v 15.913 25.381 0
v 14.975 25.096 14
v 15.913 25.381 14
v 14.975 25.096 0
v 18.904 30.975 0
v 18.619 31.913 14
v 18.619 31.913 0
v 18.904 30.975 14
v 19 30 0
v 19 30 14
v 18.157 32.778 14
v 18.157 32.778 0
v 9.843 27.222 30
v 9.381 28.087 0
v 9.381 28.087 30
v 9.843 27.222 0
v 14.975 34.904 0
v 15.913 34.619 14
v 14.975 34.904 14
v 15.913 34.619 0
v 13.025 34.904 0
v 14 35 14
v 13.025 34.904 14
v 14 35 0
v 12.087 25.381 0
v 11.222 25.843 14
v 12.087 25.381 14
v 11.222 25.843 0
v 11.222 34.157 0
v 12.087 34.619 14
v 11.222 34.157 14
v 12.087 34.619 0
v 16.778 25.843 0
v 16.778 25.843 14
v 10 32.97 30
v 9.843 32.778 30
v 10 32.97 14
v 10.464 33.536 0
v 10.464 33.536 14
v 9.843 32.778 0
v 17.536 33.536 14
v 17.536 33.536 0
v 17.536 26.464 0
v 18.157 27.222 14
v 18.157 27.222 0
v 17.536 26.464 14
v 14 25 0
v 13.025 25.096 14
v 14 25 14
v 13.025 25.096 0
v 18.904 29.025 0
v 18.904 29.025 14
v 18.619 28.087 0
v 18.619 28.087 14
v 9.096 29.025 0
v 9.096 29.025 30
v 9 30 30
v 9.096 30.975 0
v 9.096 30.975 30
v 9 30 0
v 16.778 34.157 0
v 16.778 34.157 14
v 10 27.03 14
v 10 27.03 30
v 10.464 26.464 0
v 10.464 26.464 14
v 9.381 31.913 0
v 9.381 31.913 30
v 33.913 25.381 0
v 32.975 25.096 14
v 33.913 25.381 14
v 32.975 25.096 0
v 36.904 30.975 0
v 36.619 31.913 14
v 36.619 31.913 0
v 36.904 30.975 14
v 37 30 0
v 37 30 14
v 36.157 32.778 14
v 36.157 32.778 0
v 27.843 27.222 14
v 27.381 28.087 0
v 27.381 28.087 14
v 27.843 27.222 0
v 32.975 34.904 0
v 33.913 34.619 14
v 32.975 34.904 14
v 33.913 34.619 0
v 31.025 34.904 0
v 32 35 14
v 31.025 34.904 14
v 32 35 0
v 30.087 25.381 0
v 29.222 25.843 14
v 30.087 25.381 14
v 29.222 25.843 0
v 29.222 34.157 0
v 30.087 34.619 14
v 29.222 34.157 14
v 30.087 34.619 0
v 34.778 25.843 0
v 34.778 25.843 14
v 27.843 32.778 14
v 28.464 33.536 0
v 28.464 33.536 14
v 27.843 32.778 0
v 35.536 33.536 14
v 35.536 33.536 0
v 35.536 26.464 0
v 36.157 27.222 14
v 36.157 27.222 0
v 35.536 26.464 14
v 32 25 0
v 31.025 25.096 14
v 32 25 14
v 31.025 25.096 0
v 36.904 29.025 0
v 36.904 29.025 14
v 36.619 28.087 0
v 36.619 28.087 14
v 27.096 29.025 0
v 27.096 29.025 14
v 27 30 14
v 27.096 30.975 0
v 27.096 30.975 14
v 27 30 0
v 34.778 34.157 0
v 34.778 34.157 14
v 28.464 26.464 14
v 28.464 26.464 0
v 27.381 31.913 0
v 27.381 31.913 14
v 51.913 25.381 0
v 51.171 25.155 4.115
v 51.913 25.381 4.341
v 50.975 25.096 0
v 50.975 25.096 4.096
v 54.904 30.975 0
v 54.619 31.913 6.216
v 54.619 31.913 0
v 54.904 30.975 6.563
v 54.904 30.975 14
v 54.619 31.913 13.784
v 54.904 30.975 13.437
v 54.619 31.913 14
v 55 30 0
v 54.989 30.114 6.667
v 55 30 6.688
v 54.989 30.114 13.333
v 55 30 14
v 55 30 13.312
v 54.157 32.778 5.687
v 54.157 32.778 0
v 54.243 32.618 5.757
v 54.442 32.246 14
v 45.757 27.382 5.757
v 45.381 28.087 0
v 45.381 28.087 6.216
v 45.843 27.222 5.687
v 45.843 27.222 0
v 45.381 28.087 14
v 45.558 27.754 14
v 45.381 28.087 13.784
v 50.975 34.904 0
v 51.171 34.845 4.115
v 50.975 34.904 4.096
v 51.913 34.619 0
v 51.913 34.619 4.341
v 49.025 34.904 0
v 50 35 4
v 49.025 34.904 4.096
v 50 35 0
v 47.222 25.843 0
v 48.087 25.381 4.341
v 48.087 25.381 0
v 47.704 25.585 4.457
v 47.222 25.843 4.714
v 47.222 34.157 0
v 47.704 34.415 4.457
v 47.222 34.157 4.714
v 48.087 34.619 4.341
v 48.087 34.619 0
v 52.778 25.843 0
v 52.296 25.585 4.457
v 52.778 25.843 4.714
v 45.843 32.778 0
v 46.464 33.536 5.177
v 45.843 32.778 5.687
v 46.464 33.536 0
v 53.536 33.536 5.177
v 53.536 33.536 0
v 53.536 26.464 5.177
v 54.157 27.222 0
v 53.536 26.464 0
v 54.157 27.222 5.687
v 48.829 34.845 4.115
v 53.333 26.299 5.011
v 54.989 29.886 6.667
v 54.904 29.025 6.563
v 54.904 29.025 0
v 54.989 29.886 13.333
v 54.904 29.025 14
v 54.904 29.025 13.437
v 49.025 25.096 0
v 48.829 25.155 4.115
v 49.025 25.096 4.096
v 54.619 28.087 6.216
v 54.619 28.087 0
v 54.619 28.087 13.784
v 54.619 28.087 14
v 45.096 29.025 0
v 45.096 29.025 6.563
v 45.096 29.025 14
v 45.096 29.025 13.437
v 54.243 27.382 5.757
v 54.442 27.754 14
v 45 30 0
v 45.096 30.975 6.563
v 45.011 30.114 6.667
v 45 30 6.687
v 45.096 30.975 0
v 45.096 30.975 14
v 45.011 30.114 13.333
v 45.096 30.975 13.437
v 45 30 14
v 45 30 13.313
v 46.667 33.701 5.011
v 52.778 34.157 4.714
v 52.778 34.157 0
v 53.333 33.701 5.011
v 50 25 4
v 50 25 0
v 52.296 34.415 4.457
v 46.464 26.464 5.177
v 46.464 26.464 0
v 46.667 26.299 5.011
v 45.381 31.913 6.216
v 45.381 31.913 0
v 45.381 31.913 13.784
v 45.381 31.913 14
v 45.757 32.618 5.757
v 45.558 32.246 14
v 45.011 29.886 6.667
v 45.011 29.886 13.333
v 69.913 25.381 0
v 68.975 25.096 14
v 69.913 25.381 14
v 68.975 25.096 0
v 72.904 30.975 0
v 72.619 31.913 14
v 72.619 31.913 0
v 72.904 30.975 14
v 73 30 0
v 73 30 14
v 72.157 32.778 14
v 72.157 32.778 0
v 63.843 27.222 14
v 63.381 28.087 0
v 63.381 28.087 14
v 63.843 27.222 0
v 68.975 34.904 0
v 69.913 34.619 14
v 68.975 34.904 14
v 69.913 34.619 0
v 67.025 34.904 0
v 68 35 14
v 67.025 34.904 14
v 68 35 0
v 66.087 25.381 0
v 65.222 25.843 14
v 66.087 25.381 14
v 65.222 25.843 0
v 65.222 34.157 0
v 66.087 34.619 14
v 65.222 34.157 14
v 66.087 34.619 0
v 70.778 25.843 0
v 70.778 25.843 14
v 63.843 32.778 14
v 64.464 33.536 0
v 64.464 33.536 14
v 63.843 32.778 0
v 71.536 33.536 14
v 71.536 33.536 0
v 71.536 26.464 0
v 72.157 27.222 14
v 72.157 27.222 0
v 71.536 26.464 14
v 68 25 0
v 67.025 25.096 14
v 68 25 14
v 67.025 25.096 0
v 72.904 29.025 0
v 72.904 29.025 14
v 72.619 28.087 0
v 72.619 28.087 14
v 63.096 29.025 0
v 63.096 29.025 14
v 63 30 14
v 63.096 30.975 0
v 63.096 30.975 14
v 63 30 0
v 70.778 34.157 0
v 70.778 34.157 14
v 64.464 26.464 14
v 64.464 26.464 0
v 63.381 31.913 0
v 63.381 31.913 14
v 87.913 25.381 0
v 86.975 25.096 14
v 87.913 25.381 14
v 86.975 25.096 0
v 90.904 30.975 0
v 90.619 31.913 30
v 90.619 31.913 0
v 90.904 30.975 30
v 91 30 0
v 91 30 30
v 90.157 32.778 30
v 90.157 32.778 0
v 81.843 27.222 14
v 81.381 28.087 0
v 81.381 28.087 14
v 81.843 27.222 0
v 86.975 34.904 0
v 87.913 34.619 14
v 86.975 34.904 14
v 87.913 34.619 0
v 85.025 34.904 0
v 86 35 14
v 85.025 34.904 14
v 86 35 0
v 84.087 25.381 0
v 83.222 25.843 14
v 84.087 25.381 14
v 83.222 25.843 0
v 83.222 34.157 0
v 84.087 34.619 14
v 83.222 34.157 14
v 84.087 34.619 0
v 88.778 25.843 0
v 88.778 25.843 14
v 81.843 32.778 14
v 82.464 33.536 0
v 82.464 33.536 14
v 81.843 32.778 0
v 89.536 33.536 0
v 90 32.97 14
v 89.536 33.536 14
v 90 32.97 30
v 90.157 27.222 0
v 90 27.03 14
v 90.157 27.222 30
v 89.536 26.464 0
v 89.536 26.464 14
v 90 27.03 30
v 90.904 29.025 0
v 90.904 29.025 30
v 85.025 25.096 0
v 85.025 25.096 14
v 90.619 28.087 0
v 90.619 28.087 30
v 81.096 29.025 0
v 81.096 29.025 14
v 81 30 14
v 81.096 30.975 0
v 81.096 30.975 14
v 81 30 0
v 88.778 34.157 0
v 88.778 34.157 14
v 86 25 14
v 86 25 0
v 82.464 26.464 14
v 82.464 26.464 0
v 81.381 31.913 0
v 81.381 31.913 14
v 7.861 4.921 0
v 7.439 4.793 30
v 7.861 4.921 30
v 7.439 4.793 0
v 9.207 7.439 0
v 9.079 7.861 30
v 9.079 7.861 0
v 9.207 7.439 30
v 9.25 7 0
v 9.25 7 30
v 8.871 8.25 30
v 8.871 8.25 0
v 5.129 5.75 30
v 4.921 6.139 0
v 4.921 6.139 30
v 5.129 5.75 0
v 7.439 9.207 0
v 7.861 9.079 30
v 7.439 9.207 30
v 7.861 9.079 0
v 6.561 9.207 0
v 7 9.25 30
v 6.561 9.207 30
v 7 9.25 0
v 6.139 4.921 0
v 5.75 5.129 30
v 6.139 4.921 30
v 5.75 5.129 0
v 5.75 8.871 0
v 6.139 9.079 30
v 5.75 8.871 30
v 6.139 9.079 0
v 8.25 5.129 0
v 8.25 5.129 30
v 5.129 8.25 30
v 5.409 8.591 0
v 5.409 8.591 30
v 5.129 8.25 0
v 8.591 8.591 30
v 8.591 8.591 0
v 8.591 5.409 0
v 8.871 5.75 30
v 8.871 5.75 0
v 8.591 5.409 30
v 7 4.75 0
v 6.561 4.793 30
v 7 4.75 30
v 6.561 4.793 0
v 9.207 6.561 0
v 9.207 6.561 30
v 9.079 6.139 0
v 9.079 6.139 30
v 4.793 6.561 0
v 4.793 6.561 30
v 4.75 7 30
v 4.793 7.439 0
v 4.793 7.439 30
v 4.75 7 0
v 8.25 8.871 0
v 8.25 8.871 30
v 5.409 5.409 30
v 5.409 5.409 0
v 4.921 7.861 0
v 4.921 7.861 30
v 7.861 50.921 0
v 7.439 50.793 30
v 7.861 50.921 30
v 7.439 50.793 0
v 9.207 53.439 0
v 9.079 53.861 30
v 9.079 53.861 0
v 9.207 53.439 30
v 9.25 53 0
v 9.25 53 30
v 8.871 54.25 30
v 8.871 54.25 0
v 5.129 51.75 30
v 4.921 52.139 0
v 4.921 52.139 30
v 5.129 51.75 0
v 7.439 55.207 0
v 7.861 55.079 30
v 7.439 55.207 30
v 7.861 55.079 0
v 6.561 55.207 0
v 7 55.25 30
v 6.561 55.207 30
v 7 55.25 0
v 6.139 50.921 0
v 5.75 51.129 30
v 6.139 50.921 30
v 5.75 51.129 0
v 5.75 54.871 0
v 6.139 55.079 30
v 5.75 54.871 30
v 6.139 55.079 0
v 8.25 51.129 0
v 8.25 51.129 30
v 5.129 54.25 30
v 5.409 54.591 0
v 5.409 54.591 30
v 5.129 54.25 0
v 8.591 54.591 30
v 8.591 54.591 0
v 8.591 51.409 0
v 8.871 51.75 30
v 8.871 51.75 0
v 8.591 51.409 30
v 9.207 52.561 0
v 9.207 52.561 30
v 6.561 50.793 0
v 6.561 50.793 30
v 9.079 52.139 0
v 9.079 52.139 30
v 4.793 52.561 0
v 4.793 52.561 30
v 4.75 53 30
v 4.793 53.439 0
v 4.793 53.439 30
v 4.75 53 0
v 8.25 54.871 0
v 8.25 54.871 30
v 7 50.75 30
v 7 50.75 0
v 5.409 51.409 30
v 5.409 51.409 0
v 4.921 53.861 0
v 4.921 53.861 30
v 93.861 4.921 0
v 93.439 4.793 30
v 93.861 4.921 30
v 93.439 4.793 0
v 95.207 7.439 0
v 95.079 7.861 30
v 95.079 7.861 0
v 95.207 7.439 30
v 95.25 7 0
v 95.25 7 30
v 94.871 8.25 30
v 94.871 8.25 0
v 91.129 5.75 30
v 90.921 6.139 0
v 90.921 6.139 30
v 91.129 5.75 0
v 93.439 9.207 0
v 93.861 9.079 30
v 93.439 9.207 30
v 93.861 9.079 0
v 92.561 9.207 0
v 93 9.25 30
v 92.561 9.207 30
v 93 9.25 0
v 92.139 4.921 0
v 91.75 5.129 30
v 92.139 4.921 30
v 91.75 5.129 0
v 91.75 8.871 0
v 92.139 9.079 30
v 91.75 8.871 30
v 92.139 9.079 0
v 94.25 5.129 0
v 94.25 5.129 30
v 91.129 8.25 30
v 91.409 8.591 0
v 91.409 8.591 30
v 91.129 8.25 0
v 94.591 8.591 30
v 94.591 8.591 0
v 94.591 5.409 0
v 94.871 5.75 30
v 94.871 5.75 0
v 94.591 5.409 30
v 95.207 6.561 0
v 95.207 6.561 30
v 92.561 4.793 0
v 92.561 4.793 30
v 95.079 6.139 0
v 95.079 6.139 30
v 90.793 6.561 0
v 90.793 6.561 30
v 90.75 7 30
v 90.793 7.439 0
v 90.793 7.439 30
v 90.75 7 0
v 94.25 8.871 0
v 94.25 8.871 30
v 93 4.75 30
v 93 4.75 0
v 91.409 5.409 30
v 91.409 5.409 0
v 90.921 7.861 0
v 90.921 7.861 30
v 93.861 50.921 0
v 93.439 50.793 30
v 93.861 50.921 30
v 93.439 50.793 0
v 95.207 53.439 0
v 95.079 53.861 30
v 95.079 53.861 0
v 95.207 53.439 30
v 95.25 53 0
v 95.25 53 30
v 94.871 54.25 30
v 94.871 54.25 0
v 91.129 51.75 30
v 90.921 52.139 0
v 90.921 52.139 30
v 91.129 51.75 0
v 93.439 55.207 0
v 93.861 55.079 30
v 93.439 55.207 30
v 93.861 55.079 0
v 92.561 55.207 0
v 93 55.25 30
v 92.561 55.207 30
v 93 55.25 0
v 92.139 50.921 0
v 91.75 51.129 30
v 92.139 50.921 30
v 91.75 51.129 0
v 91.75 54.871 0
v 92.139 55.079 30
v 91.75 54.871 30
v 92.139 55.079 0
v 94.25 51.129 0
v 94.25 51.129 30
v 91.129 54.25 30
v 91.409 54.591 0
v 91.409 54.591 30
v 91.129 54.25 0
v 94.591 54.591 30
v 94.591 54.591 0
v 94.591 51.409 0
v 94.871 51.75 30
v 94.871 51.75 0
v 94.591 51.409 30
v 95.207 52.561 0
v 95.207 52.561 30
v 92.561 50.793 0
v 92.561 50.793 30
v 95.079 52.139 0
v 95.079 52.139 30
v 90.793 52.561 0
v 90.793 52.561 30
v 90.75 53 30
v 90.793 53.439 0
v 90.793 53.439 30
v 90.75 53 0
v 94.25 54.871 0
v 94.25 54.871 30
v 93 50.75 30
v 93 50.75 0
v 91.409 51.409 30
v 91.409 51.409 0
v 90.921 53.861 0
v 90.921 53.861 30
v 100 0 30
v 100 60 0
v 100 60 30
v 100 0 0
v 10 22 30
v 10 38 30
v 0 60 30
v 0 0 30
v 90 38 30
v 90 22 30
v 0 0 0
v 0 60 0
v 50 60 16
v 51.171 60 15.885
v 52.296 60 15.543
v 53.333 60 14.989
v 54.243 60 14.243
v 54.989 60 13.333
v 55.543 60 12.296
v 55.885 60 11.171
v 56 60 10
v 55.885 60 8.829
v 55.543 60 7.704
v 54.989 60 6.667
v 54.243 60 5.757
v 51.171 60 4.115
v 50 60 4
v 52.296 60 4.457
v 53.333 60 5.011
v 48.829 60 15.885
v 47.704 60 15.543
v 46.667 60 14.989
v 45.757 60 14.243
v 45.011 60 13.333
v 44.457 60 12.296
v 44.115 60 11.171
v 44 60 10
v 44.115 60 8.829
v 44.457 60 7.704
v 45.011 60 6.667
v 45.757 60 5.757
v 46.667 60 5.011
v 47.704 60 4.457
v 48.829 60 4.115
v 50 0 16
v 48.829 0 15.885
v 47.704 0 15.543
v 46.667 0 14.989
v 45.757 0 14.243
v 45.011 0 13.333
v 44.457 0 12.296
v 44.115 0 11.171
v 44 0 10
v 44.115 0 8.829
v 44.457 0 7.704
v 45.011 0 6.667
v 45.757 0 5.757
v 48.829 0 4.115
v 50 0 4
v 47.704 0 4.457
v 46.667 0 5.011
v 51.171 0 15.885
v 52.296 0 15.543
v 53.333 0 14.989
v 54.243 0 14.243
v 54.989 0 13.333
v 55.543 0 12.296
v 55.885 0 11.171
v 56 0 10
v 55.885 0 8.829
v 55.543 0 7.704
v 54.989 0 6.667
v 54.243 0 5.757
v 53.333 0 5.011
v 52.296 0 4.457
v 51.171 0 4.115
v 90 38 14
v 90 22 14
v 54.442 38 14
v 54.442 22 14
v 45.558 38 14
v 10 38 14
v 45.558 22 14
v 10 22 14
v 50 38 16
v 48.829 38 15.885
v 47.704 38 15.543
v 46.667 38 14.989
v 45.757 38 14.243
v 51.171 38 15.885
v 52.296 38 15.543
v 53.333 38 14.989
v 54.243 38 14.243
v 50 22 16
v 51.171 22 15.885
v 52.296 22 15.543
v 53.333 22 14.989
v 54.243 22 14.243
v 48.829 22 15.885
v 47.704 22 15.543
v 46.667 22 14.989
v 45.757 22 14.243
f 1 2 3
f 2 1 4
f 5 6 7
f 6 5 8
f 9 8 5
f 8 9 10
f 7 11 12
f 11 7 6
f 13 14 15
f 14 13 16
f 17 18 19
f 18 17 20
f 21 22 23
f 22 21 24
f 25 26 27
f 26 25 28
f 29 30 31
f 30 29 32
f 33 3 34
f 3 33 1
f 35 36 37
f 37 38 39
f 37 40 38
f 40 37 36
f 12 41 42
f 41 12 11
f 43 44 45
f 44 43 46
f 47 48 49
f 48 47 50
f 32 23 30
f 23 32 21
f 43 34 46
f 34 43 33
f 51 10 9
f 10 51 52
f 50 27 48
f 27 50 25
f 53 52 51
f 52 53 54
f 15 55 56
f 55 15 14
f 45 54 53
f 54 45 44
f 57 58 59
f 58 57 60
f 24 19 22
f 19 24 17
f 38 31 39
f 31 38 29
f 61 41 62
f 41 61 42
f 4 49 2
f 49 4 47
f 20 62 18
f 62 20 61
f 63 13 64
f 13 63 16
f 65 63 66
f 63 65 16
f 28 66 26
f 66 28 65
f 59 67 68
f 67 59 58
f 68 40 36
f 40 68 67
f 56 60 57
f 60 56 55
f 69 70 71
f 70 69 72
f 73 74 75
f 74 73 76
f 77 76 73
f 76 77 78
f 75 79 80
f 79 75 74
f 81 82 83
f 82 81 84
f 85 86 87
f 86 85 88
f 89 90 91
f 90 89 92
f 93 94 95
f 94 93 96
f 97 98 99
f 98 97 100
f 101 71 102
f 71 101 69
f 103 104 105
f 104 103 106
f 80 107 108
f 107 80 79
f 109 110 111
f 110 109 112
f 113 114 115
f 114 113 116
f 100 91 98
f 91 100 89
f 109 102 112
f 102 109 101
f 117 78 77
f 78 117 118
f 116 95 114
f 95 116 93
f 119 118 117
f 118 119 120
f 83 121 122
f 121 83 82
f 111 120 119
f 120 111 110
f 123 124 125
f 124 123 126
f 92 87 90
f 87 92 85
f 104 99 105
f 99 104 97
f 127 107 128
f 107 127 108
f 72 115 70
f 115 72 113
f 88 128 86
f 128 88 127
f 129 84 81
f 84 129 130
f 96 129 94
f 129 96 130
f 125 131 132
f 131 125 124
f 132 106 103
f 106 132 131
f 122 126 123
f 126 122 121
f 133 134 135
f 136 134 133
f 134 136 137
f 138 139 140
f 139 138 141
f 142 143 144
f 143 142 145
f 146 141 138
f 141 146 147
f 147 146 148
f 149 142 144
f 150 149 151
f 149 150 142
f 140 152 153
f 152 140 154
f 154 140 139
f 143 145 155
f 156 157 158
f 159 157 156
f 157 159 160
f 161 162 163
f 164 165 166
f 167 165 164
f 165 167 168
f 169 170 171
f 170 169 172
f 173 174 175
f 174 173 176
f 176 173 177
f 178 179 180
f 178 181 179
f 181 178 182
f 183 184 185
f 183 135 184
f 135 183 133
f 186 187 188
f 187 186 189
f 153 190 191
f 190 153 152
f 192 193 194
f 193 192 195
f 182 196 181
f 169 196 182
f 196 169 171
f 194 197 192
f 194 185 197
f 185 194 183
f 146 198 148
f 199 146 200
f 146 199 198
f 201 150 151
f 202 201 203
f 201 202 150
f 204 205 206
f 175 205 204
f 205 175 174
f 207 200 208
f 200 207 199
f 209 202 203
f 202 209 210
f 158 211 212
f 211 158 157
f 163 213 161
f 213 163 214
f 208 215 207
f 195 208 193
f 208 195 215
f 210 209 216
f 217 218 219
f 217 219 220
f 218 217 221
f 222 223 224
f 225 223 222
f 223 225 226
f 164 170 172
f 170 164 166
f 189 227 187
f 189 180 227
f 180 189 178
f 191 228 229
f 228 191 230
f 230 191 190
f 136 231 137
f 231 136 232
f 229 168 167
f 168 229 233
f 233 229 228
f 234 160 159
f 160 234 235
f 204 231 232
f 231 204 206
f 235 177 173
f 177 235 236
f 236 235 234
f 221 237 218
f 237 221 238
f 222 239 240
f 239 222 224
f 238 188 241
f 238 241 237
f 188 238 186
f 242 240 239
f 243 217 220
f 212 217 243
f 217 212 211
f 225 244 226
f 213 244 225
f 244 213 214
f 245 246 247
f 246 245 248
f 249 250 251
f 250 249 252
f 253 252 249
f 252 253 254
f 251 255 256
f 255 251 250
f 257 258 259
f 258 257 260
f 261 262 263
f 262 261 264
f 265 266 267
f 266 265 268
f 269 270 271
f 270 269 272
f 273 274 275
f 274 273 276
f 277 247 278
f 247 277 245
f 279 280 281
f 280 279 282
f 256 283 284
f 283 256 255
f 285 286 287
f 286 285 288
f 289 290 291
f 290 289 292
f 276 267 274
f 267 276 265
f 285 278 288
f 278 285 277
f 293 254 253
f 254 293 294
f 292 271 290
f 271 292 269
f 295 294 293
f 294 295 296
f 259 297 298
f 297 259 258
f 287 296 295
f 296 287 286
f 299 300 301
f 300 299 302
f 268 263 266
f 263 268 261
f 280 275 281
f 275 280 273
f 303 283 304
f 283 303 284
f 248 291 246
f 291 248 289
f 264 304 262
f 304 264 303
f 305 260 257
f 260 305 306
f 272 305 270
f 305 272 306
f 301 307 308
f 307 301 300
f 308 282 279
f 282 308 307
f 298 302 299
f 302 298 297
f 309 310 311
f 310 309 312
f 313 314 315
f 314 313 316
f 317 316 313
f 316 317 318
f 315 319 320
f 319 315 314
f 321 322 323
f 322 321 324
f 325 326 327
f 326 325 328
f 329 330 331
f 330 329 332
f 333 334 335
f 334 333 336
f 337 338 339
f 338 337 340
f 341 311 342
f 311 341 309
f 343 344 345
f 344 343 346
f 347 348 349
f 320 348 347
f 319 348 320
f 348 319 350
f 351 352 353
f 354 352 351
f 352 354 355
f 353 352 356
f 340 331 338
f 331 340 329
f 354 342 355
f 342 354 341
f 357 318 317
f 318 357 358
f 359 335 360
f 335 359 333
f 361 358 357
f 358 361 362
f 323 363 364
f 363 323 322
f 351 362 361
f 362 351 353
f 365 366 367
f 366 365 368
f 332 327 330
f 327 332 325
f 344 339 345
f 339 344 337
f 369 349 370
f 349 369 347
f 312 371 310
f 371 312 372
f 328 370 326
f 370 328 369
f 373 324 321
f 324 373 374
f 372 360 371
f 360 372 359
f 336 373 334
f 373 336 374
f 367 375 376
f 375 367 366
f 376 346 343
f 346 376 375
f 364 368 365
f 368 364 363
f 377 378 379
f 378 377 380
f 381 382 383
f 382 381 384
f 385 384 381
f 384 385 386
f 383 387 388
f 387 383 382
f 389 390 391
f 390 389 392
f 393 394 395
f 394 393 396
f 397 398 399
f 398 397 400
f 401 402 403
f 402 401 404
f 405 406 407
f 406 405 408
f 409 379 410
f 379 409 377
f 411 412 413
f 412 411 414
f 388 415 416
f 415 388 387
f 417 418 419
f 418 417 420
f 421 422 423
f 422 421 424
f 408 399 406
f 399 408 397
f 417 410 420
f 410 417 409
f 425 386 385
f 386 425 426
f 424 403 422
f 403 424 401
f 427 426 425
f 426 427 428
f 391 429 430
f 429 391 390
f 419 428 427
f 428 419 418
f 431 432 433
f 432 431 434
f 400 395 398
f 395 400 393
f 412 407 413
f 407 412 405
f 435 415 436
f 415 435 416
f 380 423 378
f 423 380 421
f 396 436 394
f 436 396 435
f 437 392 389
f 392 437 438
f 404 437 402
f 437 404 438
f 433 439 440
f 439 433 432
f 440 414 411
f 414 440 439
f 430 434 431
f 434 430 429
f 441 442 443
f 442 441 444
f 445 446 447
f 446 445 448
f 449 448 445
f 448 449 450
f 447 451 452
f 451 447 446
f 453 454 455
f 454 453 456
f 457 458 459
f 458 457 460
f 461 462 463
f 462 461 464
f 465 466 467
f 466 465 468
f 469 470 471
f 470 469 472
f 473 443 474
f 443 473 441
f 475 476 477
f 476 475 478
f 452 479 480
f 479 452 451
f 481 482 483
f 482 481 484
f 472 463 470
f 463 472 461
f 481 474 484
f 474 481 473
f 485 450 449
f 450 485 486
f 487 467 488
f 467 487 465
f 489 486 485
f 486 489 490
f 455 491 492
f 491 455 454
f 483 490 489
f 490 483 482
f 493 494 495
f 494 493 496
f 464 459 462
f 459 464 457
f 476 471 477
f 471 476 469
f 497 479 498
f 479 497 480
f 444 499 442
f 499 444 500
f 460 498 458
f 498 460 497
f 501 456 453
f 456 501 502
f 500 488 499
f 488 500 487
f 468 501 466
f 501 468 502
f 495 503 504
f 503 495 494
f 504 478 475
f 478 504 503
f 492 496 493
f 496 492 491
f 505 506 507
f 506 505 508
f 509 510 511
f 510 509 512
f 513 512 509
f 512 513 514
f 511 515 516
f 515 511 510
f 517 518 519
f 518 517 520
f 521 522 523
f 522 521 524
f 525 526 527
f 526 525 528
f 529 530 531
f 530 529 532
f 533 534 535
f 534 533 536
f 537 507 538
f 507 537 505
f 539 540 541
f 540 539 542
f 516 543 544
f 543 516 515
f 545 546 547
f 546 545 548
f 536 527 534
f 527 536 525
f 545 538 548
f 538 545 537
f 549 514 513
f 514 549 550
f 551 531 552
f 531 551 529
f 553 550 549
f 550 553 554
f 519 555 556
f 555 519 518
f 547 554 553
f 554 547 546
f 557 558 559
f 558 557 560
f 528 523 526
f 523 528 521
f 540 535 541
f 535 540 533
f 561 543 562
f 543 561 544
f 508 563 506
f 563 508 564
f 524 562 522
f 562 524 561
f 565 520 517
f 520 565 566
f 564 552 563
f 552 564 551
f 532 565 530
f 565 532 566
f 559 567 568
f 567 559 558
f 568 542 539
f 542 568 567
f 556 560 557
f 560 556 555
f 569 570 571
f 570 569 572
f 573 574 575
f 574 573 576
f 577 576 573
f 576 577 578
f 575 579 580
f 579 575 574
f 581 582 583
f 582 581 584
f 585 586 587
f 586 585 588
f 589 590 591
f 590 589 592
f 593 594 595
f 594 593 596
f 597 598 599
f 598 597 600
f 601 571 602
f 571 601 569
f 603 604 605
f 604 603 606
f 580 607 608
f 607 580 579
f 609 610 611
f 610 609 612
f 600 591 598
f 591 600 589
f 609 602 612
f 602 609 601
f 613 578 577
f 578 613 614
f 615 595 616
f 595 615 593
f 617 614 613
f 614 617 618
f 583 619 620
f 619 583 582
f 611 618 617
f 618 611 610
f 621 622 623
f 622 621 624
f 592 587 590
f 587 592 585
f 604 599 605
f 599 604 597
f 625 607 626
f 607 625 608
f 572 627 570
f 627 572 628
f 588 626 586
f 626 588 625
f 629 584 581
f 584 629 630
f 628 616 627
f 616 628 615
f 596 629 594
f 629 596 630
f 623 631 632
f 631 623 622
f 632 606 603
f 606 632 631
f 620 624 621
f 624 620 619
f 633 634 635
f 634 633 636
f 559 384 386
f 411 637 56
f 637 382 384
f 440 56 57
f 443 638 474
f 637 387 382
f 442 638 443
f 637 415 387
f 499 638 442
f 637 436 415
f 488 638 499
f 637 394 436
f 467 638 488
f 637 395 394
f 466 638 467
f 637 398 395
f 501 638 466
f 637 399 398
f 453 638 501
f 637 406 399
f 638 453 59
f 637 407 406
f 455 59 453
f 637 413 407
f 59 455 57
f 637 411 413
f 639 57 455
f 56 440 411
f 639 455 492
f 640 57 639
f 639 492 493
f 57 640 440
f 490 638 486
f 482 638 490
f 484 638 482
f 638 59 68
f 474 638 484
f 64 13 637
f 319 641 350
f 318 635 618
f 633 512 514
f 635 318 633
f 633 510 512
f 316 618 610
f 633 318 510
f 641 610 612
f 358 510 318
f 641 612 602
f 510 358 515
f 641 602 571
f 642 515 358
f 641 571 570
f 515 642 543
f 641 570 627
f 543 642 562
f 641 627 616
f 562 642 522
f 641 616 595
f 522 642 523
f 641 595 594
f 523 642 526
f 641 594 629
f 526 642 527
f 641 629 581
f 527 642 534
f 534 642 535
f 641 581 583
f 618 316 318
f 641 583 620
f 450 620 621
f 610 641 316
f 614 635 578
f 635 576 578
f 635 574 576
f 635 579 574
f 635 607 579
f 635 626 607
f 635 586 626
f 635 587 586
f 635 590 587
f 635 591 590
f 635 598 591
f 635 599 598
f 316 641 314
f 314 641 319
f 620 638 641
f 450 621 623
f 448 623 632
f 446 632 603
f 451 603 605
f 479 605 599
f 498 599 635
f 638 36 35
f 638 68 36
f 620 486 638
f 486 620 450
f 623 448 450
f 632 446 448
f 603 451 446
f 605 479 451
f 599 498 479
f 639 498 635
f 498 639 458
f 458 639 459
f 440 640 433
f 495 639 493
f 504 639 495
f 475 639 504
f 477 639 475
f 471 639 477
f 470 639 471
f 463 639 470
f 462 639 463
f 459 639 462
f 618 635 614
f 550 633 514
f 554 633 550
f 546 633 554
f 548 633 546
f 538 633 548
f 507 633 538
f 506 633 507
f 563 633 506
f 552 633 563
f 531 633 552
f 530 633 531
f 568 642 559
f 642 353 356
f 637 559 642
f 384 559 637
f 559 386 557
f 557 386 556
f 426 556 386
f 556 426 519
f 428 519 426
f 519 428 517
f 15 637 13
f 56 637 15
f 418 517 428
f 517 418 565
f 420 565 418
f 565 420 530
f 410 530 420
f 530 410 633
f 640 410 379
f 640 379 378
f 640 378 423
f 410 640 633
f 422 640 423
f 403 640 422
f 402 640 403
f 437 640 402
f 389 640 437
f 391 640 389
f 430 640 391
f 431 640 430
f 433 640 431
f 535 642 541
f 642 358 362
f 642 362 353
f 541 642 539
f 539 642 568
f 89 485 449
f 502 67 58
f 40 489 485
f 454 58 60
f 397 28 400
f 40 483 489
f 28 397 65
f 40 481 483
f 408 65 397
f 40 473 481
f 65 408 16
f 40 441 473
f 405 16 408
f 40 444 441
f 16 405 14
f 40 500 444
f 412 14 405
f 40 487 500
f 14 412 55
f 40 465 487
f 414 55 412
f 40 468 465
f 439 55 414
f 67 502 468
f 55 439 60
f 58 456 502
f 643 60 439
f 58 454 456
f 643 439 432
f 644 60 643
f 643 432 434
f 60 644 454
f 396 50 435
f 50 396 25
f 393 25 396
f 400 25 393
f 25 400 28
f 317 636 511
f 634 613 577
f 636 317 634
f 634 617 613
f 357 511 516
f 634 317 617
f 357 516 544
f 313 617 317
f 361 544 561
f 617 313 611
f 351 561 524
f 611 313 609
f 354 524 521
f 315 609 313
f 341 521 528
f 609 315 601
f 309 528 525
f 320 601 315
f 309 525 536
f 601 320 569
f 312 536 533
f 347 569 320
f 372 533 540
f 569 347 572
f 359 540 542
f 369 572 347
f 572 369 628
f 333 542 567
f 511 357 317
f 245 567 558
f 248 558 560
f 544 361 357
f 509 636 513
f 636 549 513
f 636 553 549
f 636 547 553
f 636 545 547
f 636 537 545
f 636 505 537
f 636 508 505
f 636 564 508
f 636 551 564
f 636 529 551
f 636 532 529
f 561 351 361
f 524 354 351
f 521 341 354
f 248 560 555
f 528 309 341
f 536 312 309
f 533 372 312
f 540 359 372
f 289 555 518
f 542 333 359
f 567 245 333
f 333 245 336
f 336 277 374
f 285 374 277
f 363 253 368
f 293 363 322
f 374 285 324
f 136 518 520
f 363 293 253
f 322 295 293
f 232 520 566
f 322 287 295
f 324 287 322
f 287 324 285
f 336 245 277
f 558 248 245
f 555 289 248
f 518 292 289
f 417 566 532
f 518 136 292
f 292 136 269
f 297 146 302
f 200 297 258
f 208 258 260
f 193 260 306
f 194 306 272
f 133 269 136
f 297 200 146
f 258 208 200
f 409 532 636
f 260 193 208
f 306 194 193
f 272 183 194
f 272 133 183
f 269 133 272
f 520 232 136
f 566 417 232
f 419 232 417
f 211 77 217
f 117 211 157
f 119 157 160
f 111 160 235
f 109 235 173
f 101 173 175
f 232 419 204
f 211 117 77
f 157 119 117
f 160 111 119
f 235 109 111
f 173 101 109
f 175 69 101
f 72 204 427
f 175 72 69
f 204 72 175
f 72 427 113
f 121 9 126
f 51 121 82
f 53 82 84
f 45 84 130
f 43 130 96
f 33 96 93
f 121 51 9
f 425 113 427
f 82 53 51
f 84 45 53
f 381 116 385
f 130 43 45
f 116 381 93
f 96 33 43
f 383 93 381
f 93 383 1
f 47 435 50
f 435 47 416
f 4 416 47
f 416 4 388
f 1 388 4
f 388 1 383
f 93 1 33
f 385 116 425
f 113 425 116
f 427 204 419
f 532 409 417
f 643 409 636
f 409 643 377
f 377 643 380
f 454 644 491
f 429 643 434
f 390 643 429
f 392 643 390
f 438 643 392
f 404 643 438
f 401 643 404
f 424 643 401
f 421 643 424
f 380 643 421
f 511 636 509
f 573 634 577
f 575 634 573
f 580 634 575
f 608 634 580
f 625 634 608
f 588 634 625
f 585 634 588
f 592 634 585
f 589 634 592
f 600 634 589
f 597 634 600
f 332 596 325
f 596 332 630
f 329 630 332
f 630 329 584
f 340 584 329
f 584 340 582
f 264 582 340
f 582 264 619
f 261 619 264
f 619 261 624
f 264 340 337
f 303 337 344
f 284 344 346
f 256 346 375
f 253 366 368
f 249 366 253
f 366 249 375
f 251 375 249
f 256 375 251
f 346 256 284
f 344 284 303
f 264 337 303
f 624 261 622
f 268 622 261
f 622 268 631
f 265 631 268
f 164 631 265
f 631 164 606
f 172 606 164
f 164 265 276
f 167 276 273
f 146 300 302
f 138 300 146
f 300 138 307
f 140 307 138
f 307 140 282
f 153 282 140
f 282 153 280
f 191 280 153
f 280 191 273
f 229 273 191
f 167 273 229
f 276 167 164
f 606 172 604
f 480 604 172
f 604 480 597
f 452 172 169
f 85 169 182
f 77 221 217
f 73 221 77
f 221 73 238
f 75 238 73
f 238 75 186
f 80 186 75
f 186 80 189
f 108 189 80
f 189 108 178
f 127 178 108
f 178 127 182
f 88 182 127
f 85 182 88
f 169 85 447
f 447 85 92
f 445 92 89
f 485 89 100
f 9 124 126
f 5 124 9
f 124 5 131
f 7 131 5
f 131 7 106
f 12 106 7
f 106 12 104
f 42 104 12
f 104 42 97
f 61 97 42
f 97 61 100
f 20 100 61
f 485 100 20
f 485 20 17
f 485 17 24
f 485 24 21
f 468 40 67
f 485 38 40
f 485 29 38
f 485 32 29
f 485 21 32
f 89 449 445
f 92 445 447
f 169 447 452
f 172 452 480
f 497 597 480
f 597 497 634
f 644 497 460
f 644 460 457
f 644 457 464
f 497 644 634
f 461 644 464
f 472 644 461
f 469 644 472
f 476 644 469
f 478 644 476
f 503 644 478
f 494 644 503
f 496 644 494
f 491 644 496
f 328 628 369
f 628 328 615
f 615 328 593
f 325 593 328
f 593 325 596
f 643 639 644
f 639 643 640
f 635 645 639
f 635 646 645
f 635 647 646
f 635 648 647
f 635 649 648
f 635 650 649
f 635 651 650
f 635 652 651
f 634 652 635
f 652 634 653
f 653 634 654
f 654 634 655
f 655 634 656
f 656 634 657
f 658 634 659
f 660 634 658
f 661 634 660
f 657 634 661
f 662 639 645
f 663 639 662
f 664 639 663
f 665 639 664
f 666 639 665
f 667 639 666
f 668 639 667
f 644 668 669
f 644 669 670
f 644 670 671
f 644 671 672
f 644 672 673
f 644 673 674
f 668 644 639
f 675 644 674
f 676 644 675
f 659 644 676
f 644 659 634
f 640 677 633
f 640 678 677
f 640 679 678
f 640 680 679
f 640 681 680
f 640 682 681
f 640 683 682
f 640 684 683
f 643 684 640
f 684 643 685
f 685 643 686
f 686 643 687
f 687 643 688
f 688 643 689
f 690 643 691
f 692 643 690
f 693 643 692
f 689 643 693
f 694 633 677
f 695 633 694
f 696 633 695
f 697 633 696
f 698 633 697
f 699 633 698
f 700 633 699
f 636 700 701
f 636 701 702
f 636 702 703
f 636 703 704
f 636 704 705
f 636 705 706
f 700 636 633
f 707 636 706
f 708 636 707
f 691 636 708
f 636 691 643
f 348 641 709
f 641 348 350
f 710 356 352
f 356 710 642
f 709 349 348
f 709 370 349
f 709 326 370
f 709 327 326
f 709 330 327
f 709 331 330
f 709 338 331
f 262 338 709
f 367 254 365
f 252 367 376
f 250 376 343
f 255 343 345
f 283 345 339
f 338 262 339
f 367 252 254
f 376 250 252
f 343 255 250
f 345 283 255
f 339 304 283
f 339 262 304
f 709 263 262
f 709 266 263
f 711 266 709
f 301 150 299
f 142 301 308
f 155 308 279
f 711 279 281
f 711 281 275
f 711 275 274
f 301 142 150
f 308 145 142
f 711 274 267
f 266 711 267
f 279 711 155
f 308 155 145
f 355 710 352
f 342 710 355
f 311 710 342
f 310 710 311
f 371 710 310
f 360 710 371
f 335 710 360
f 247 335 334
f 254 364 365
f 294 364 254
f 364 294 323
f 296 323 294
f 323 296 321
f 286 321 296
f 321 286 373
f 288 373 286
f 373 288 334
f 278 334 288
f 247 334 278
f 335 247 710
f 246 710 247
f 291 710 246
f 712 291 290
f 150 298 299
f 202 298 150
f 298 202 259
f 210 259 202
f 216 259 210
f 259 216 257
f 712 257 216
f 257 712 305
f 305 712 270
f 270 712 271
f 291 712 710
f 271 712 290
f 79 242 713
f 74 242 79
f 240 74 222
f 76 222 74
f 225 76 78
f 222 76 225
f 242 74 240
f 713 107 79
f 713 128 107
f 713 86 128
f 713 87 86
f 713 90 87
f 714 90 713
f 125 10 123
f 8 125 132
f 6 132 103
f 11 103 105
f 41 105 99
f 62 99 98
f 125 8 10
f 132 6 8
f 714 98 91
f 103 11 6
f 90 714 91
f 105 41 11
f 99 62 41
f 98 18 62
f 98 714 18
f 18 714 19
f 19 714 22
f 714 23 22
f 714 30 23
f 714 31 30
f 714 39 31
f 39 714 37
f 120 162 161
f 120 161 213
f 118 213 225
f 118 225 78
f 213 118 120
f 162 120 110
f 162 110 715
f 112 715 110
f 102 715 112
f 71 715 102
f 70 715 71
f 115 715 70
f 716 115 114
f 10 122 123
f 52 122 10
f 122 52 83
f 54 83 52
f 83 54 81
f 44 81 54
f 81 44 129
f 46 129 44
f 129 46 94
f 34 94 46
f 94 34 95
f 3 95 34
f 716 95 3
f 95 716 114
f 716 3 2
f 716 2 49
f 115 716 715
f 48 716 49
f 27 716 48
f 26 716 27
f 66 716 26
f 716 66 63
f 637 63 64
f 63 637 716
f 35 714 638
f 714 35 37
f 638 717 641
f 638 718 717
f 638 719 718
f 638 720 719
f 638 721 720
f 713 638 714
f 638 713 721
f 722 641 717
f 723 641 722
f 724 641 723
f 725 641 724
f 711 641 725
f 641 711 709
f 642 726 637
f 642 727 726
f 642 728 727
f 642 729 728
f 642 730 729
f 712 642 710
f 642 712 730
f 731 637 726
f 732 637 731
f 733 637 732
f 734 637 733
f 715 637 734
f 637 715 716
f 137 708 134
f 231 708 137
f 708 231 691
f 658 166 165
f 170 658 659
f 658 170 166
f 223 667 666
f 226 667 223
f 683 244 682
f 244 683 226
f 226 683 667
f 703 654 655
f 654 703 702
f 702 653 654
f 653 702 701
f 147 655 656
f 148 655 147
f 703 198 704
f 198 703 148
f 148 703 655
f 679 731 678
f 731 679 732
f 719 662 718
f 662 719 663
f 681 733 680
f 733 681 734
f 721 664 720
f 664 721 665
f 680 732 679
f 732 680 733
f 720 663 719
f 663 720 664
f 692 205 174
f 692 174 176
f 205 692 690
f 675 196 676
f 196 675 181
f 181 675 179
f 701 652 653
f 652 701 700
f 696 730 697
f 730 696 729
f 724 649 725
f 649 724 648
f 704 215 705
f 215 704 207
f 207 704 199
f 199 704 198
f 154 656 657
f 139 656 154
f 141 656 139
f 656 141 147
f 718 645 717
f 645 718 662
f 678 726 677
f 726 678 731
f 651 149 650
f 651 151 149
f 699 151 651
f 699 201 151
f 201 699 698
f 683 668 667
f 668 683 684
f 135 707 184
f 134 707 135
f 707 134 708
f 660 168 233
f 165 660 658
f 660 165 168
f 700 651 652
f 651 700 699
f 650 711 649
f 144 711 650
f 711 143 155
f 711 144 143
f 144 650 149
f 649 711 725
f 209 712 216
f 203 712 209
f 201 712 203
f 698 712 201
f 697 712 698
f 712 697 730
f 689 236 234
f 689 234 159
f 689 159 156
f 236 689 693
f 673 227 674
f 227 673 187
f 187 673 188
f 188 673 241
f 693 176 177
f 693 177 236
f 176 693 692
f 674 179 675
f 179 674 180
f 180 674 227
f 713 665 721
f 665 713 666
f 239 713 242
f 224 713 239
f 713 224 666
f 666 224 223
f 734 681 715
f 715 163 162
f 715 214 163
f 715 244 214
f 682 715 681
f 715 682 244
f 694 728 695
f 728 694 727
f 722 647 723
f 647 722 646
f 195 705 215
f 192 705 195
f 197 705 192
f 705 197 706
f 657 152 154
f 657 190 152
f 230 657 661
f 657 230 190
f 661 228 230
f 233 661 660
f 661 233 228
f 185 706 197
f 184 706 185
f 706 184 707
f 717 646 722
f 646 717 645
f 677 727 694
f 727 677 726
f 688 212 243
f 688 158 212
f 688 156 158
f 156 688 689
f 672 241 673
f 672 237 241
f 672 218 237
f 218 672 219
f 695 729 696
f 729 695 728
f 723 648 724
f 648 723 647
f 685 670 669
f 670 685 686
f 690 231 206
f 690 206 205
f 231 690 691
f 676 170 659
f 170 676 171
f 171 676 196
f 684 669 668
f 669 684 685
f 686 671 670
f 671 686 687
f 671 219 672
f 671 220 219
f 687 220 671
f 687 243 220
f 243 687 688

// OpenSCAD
$fn = 32;

// ----------------------------------------------------------------------
// Manifold block: side_outlet manifold
// ----------------------------------------------------------------------

// --- parameters (mm) ---
block_l = 100;            // block length, X
block_w = 60;             // block width, Y
block_h = 30;             // block height, Z
port_d = 10;              // port bore diameter
port_pitch = 18;          // port pitch along X
gallery_d = 16;           // top gallery width, Y
gallery_depth = 16;       // gallery pocket depth
wall_p = 10;              // gallery end wall thickness, X
mnt_d = 4.5;              // mounting hole diameter
mnt_in = 7;               // mounting hole inset from the edges
out_d = 12;               // outlet bore diameter
out_z = 10;               // outlet axis height

n_ports = 5;  // ports in the row
port_x0 = (block_l - (n_ports - 1) * port_pitch) / 2;  // first port X

difference() {
  cube([block_l, block_w, block_h]);
  for (i = [0 : n_ports - 1])
    translate([port_x0 + i * port_pitch, block_w / 2, -1])
      cylinder(h = block_h + 2, d = port_d);
  translate([wall_p, block_w / 2 - gallery_d / 2, block_h - gallery_depth])
    cube([block_l - 2 * wall_p, gallery_d, gallery_depth + 1]);
  for (cx = [mnt_in, block_l - mnt_in])
    for (cy = [mnt_in, block_w - mnt_in])
      translate([cx, cy, -1]) cylinder(h = block_h + 2, d = mnt_d);
  translate([block_l / 2, -1, out_z]) rotate([-90, 0, 0])
    cylinder(h = block_w + 2, d = out_d);
}
